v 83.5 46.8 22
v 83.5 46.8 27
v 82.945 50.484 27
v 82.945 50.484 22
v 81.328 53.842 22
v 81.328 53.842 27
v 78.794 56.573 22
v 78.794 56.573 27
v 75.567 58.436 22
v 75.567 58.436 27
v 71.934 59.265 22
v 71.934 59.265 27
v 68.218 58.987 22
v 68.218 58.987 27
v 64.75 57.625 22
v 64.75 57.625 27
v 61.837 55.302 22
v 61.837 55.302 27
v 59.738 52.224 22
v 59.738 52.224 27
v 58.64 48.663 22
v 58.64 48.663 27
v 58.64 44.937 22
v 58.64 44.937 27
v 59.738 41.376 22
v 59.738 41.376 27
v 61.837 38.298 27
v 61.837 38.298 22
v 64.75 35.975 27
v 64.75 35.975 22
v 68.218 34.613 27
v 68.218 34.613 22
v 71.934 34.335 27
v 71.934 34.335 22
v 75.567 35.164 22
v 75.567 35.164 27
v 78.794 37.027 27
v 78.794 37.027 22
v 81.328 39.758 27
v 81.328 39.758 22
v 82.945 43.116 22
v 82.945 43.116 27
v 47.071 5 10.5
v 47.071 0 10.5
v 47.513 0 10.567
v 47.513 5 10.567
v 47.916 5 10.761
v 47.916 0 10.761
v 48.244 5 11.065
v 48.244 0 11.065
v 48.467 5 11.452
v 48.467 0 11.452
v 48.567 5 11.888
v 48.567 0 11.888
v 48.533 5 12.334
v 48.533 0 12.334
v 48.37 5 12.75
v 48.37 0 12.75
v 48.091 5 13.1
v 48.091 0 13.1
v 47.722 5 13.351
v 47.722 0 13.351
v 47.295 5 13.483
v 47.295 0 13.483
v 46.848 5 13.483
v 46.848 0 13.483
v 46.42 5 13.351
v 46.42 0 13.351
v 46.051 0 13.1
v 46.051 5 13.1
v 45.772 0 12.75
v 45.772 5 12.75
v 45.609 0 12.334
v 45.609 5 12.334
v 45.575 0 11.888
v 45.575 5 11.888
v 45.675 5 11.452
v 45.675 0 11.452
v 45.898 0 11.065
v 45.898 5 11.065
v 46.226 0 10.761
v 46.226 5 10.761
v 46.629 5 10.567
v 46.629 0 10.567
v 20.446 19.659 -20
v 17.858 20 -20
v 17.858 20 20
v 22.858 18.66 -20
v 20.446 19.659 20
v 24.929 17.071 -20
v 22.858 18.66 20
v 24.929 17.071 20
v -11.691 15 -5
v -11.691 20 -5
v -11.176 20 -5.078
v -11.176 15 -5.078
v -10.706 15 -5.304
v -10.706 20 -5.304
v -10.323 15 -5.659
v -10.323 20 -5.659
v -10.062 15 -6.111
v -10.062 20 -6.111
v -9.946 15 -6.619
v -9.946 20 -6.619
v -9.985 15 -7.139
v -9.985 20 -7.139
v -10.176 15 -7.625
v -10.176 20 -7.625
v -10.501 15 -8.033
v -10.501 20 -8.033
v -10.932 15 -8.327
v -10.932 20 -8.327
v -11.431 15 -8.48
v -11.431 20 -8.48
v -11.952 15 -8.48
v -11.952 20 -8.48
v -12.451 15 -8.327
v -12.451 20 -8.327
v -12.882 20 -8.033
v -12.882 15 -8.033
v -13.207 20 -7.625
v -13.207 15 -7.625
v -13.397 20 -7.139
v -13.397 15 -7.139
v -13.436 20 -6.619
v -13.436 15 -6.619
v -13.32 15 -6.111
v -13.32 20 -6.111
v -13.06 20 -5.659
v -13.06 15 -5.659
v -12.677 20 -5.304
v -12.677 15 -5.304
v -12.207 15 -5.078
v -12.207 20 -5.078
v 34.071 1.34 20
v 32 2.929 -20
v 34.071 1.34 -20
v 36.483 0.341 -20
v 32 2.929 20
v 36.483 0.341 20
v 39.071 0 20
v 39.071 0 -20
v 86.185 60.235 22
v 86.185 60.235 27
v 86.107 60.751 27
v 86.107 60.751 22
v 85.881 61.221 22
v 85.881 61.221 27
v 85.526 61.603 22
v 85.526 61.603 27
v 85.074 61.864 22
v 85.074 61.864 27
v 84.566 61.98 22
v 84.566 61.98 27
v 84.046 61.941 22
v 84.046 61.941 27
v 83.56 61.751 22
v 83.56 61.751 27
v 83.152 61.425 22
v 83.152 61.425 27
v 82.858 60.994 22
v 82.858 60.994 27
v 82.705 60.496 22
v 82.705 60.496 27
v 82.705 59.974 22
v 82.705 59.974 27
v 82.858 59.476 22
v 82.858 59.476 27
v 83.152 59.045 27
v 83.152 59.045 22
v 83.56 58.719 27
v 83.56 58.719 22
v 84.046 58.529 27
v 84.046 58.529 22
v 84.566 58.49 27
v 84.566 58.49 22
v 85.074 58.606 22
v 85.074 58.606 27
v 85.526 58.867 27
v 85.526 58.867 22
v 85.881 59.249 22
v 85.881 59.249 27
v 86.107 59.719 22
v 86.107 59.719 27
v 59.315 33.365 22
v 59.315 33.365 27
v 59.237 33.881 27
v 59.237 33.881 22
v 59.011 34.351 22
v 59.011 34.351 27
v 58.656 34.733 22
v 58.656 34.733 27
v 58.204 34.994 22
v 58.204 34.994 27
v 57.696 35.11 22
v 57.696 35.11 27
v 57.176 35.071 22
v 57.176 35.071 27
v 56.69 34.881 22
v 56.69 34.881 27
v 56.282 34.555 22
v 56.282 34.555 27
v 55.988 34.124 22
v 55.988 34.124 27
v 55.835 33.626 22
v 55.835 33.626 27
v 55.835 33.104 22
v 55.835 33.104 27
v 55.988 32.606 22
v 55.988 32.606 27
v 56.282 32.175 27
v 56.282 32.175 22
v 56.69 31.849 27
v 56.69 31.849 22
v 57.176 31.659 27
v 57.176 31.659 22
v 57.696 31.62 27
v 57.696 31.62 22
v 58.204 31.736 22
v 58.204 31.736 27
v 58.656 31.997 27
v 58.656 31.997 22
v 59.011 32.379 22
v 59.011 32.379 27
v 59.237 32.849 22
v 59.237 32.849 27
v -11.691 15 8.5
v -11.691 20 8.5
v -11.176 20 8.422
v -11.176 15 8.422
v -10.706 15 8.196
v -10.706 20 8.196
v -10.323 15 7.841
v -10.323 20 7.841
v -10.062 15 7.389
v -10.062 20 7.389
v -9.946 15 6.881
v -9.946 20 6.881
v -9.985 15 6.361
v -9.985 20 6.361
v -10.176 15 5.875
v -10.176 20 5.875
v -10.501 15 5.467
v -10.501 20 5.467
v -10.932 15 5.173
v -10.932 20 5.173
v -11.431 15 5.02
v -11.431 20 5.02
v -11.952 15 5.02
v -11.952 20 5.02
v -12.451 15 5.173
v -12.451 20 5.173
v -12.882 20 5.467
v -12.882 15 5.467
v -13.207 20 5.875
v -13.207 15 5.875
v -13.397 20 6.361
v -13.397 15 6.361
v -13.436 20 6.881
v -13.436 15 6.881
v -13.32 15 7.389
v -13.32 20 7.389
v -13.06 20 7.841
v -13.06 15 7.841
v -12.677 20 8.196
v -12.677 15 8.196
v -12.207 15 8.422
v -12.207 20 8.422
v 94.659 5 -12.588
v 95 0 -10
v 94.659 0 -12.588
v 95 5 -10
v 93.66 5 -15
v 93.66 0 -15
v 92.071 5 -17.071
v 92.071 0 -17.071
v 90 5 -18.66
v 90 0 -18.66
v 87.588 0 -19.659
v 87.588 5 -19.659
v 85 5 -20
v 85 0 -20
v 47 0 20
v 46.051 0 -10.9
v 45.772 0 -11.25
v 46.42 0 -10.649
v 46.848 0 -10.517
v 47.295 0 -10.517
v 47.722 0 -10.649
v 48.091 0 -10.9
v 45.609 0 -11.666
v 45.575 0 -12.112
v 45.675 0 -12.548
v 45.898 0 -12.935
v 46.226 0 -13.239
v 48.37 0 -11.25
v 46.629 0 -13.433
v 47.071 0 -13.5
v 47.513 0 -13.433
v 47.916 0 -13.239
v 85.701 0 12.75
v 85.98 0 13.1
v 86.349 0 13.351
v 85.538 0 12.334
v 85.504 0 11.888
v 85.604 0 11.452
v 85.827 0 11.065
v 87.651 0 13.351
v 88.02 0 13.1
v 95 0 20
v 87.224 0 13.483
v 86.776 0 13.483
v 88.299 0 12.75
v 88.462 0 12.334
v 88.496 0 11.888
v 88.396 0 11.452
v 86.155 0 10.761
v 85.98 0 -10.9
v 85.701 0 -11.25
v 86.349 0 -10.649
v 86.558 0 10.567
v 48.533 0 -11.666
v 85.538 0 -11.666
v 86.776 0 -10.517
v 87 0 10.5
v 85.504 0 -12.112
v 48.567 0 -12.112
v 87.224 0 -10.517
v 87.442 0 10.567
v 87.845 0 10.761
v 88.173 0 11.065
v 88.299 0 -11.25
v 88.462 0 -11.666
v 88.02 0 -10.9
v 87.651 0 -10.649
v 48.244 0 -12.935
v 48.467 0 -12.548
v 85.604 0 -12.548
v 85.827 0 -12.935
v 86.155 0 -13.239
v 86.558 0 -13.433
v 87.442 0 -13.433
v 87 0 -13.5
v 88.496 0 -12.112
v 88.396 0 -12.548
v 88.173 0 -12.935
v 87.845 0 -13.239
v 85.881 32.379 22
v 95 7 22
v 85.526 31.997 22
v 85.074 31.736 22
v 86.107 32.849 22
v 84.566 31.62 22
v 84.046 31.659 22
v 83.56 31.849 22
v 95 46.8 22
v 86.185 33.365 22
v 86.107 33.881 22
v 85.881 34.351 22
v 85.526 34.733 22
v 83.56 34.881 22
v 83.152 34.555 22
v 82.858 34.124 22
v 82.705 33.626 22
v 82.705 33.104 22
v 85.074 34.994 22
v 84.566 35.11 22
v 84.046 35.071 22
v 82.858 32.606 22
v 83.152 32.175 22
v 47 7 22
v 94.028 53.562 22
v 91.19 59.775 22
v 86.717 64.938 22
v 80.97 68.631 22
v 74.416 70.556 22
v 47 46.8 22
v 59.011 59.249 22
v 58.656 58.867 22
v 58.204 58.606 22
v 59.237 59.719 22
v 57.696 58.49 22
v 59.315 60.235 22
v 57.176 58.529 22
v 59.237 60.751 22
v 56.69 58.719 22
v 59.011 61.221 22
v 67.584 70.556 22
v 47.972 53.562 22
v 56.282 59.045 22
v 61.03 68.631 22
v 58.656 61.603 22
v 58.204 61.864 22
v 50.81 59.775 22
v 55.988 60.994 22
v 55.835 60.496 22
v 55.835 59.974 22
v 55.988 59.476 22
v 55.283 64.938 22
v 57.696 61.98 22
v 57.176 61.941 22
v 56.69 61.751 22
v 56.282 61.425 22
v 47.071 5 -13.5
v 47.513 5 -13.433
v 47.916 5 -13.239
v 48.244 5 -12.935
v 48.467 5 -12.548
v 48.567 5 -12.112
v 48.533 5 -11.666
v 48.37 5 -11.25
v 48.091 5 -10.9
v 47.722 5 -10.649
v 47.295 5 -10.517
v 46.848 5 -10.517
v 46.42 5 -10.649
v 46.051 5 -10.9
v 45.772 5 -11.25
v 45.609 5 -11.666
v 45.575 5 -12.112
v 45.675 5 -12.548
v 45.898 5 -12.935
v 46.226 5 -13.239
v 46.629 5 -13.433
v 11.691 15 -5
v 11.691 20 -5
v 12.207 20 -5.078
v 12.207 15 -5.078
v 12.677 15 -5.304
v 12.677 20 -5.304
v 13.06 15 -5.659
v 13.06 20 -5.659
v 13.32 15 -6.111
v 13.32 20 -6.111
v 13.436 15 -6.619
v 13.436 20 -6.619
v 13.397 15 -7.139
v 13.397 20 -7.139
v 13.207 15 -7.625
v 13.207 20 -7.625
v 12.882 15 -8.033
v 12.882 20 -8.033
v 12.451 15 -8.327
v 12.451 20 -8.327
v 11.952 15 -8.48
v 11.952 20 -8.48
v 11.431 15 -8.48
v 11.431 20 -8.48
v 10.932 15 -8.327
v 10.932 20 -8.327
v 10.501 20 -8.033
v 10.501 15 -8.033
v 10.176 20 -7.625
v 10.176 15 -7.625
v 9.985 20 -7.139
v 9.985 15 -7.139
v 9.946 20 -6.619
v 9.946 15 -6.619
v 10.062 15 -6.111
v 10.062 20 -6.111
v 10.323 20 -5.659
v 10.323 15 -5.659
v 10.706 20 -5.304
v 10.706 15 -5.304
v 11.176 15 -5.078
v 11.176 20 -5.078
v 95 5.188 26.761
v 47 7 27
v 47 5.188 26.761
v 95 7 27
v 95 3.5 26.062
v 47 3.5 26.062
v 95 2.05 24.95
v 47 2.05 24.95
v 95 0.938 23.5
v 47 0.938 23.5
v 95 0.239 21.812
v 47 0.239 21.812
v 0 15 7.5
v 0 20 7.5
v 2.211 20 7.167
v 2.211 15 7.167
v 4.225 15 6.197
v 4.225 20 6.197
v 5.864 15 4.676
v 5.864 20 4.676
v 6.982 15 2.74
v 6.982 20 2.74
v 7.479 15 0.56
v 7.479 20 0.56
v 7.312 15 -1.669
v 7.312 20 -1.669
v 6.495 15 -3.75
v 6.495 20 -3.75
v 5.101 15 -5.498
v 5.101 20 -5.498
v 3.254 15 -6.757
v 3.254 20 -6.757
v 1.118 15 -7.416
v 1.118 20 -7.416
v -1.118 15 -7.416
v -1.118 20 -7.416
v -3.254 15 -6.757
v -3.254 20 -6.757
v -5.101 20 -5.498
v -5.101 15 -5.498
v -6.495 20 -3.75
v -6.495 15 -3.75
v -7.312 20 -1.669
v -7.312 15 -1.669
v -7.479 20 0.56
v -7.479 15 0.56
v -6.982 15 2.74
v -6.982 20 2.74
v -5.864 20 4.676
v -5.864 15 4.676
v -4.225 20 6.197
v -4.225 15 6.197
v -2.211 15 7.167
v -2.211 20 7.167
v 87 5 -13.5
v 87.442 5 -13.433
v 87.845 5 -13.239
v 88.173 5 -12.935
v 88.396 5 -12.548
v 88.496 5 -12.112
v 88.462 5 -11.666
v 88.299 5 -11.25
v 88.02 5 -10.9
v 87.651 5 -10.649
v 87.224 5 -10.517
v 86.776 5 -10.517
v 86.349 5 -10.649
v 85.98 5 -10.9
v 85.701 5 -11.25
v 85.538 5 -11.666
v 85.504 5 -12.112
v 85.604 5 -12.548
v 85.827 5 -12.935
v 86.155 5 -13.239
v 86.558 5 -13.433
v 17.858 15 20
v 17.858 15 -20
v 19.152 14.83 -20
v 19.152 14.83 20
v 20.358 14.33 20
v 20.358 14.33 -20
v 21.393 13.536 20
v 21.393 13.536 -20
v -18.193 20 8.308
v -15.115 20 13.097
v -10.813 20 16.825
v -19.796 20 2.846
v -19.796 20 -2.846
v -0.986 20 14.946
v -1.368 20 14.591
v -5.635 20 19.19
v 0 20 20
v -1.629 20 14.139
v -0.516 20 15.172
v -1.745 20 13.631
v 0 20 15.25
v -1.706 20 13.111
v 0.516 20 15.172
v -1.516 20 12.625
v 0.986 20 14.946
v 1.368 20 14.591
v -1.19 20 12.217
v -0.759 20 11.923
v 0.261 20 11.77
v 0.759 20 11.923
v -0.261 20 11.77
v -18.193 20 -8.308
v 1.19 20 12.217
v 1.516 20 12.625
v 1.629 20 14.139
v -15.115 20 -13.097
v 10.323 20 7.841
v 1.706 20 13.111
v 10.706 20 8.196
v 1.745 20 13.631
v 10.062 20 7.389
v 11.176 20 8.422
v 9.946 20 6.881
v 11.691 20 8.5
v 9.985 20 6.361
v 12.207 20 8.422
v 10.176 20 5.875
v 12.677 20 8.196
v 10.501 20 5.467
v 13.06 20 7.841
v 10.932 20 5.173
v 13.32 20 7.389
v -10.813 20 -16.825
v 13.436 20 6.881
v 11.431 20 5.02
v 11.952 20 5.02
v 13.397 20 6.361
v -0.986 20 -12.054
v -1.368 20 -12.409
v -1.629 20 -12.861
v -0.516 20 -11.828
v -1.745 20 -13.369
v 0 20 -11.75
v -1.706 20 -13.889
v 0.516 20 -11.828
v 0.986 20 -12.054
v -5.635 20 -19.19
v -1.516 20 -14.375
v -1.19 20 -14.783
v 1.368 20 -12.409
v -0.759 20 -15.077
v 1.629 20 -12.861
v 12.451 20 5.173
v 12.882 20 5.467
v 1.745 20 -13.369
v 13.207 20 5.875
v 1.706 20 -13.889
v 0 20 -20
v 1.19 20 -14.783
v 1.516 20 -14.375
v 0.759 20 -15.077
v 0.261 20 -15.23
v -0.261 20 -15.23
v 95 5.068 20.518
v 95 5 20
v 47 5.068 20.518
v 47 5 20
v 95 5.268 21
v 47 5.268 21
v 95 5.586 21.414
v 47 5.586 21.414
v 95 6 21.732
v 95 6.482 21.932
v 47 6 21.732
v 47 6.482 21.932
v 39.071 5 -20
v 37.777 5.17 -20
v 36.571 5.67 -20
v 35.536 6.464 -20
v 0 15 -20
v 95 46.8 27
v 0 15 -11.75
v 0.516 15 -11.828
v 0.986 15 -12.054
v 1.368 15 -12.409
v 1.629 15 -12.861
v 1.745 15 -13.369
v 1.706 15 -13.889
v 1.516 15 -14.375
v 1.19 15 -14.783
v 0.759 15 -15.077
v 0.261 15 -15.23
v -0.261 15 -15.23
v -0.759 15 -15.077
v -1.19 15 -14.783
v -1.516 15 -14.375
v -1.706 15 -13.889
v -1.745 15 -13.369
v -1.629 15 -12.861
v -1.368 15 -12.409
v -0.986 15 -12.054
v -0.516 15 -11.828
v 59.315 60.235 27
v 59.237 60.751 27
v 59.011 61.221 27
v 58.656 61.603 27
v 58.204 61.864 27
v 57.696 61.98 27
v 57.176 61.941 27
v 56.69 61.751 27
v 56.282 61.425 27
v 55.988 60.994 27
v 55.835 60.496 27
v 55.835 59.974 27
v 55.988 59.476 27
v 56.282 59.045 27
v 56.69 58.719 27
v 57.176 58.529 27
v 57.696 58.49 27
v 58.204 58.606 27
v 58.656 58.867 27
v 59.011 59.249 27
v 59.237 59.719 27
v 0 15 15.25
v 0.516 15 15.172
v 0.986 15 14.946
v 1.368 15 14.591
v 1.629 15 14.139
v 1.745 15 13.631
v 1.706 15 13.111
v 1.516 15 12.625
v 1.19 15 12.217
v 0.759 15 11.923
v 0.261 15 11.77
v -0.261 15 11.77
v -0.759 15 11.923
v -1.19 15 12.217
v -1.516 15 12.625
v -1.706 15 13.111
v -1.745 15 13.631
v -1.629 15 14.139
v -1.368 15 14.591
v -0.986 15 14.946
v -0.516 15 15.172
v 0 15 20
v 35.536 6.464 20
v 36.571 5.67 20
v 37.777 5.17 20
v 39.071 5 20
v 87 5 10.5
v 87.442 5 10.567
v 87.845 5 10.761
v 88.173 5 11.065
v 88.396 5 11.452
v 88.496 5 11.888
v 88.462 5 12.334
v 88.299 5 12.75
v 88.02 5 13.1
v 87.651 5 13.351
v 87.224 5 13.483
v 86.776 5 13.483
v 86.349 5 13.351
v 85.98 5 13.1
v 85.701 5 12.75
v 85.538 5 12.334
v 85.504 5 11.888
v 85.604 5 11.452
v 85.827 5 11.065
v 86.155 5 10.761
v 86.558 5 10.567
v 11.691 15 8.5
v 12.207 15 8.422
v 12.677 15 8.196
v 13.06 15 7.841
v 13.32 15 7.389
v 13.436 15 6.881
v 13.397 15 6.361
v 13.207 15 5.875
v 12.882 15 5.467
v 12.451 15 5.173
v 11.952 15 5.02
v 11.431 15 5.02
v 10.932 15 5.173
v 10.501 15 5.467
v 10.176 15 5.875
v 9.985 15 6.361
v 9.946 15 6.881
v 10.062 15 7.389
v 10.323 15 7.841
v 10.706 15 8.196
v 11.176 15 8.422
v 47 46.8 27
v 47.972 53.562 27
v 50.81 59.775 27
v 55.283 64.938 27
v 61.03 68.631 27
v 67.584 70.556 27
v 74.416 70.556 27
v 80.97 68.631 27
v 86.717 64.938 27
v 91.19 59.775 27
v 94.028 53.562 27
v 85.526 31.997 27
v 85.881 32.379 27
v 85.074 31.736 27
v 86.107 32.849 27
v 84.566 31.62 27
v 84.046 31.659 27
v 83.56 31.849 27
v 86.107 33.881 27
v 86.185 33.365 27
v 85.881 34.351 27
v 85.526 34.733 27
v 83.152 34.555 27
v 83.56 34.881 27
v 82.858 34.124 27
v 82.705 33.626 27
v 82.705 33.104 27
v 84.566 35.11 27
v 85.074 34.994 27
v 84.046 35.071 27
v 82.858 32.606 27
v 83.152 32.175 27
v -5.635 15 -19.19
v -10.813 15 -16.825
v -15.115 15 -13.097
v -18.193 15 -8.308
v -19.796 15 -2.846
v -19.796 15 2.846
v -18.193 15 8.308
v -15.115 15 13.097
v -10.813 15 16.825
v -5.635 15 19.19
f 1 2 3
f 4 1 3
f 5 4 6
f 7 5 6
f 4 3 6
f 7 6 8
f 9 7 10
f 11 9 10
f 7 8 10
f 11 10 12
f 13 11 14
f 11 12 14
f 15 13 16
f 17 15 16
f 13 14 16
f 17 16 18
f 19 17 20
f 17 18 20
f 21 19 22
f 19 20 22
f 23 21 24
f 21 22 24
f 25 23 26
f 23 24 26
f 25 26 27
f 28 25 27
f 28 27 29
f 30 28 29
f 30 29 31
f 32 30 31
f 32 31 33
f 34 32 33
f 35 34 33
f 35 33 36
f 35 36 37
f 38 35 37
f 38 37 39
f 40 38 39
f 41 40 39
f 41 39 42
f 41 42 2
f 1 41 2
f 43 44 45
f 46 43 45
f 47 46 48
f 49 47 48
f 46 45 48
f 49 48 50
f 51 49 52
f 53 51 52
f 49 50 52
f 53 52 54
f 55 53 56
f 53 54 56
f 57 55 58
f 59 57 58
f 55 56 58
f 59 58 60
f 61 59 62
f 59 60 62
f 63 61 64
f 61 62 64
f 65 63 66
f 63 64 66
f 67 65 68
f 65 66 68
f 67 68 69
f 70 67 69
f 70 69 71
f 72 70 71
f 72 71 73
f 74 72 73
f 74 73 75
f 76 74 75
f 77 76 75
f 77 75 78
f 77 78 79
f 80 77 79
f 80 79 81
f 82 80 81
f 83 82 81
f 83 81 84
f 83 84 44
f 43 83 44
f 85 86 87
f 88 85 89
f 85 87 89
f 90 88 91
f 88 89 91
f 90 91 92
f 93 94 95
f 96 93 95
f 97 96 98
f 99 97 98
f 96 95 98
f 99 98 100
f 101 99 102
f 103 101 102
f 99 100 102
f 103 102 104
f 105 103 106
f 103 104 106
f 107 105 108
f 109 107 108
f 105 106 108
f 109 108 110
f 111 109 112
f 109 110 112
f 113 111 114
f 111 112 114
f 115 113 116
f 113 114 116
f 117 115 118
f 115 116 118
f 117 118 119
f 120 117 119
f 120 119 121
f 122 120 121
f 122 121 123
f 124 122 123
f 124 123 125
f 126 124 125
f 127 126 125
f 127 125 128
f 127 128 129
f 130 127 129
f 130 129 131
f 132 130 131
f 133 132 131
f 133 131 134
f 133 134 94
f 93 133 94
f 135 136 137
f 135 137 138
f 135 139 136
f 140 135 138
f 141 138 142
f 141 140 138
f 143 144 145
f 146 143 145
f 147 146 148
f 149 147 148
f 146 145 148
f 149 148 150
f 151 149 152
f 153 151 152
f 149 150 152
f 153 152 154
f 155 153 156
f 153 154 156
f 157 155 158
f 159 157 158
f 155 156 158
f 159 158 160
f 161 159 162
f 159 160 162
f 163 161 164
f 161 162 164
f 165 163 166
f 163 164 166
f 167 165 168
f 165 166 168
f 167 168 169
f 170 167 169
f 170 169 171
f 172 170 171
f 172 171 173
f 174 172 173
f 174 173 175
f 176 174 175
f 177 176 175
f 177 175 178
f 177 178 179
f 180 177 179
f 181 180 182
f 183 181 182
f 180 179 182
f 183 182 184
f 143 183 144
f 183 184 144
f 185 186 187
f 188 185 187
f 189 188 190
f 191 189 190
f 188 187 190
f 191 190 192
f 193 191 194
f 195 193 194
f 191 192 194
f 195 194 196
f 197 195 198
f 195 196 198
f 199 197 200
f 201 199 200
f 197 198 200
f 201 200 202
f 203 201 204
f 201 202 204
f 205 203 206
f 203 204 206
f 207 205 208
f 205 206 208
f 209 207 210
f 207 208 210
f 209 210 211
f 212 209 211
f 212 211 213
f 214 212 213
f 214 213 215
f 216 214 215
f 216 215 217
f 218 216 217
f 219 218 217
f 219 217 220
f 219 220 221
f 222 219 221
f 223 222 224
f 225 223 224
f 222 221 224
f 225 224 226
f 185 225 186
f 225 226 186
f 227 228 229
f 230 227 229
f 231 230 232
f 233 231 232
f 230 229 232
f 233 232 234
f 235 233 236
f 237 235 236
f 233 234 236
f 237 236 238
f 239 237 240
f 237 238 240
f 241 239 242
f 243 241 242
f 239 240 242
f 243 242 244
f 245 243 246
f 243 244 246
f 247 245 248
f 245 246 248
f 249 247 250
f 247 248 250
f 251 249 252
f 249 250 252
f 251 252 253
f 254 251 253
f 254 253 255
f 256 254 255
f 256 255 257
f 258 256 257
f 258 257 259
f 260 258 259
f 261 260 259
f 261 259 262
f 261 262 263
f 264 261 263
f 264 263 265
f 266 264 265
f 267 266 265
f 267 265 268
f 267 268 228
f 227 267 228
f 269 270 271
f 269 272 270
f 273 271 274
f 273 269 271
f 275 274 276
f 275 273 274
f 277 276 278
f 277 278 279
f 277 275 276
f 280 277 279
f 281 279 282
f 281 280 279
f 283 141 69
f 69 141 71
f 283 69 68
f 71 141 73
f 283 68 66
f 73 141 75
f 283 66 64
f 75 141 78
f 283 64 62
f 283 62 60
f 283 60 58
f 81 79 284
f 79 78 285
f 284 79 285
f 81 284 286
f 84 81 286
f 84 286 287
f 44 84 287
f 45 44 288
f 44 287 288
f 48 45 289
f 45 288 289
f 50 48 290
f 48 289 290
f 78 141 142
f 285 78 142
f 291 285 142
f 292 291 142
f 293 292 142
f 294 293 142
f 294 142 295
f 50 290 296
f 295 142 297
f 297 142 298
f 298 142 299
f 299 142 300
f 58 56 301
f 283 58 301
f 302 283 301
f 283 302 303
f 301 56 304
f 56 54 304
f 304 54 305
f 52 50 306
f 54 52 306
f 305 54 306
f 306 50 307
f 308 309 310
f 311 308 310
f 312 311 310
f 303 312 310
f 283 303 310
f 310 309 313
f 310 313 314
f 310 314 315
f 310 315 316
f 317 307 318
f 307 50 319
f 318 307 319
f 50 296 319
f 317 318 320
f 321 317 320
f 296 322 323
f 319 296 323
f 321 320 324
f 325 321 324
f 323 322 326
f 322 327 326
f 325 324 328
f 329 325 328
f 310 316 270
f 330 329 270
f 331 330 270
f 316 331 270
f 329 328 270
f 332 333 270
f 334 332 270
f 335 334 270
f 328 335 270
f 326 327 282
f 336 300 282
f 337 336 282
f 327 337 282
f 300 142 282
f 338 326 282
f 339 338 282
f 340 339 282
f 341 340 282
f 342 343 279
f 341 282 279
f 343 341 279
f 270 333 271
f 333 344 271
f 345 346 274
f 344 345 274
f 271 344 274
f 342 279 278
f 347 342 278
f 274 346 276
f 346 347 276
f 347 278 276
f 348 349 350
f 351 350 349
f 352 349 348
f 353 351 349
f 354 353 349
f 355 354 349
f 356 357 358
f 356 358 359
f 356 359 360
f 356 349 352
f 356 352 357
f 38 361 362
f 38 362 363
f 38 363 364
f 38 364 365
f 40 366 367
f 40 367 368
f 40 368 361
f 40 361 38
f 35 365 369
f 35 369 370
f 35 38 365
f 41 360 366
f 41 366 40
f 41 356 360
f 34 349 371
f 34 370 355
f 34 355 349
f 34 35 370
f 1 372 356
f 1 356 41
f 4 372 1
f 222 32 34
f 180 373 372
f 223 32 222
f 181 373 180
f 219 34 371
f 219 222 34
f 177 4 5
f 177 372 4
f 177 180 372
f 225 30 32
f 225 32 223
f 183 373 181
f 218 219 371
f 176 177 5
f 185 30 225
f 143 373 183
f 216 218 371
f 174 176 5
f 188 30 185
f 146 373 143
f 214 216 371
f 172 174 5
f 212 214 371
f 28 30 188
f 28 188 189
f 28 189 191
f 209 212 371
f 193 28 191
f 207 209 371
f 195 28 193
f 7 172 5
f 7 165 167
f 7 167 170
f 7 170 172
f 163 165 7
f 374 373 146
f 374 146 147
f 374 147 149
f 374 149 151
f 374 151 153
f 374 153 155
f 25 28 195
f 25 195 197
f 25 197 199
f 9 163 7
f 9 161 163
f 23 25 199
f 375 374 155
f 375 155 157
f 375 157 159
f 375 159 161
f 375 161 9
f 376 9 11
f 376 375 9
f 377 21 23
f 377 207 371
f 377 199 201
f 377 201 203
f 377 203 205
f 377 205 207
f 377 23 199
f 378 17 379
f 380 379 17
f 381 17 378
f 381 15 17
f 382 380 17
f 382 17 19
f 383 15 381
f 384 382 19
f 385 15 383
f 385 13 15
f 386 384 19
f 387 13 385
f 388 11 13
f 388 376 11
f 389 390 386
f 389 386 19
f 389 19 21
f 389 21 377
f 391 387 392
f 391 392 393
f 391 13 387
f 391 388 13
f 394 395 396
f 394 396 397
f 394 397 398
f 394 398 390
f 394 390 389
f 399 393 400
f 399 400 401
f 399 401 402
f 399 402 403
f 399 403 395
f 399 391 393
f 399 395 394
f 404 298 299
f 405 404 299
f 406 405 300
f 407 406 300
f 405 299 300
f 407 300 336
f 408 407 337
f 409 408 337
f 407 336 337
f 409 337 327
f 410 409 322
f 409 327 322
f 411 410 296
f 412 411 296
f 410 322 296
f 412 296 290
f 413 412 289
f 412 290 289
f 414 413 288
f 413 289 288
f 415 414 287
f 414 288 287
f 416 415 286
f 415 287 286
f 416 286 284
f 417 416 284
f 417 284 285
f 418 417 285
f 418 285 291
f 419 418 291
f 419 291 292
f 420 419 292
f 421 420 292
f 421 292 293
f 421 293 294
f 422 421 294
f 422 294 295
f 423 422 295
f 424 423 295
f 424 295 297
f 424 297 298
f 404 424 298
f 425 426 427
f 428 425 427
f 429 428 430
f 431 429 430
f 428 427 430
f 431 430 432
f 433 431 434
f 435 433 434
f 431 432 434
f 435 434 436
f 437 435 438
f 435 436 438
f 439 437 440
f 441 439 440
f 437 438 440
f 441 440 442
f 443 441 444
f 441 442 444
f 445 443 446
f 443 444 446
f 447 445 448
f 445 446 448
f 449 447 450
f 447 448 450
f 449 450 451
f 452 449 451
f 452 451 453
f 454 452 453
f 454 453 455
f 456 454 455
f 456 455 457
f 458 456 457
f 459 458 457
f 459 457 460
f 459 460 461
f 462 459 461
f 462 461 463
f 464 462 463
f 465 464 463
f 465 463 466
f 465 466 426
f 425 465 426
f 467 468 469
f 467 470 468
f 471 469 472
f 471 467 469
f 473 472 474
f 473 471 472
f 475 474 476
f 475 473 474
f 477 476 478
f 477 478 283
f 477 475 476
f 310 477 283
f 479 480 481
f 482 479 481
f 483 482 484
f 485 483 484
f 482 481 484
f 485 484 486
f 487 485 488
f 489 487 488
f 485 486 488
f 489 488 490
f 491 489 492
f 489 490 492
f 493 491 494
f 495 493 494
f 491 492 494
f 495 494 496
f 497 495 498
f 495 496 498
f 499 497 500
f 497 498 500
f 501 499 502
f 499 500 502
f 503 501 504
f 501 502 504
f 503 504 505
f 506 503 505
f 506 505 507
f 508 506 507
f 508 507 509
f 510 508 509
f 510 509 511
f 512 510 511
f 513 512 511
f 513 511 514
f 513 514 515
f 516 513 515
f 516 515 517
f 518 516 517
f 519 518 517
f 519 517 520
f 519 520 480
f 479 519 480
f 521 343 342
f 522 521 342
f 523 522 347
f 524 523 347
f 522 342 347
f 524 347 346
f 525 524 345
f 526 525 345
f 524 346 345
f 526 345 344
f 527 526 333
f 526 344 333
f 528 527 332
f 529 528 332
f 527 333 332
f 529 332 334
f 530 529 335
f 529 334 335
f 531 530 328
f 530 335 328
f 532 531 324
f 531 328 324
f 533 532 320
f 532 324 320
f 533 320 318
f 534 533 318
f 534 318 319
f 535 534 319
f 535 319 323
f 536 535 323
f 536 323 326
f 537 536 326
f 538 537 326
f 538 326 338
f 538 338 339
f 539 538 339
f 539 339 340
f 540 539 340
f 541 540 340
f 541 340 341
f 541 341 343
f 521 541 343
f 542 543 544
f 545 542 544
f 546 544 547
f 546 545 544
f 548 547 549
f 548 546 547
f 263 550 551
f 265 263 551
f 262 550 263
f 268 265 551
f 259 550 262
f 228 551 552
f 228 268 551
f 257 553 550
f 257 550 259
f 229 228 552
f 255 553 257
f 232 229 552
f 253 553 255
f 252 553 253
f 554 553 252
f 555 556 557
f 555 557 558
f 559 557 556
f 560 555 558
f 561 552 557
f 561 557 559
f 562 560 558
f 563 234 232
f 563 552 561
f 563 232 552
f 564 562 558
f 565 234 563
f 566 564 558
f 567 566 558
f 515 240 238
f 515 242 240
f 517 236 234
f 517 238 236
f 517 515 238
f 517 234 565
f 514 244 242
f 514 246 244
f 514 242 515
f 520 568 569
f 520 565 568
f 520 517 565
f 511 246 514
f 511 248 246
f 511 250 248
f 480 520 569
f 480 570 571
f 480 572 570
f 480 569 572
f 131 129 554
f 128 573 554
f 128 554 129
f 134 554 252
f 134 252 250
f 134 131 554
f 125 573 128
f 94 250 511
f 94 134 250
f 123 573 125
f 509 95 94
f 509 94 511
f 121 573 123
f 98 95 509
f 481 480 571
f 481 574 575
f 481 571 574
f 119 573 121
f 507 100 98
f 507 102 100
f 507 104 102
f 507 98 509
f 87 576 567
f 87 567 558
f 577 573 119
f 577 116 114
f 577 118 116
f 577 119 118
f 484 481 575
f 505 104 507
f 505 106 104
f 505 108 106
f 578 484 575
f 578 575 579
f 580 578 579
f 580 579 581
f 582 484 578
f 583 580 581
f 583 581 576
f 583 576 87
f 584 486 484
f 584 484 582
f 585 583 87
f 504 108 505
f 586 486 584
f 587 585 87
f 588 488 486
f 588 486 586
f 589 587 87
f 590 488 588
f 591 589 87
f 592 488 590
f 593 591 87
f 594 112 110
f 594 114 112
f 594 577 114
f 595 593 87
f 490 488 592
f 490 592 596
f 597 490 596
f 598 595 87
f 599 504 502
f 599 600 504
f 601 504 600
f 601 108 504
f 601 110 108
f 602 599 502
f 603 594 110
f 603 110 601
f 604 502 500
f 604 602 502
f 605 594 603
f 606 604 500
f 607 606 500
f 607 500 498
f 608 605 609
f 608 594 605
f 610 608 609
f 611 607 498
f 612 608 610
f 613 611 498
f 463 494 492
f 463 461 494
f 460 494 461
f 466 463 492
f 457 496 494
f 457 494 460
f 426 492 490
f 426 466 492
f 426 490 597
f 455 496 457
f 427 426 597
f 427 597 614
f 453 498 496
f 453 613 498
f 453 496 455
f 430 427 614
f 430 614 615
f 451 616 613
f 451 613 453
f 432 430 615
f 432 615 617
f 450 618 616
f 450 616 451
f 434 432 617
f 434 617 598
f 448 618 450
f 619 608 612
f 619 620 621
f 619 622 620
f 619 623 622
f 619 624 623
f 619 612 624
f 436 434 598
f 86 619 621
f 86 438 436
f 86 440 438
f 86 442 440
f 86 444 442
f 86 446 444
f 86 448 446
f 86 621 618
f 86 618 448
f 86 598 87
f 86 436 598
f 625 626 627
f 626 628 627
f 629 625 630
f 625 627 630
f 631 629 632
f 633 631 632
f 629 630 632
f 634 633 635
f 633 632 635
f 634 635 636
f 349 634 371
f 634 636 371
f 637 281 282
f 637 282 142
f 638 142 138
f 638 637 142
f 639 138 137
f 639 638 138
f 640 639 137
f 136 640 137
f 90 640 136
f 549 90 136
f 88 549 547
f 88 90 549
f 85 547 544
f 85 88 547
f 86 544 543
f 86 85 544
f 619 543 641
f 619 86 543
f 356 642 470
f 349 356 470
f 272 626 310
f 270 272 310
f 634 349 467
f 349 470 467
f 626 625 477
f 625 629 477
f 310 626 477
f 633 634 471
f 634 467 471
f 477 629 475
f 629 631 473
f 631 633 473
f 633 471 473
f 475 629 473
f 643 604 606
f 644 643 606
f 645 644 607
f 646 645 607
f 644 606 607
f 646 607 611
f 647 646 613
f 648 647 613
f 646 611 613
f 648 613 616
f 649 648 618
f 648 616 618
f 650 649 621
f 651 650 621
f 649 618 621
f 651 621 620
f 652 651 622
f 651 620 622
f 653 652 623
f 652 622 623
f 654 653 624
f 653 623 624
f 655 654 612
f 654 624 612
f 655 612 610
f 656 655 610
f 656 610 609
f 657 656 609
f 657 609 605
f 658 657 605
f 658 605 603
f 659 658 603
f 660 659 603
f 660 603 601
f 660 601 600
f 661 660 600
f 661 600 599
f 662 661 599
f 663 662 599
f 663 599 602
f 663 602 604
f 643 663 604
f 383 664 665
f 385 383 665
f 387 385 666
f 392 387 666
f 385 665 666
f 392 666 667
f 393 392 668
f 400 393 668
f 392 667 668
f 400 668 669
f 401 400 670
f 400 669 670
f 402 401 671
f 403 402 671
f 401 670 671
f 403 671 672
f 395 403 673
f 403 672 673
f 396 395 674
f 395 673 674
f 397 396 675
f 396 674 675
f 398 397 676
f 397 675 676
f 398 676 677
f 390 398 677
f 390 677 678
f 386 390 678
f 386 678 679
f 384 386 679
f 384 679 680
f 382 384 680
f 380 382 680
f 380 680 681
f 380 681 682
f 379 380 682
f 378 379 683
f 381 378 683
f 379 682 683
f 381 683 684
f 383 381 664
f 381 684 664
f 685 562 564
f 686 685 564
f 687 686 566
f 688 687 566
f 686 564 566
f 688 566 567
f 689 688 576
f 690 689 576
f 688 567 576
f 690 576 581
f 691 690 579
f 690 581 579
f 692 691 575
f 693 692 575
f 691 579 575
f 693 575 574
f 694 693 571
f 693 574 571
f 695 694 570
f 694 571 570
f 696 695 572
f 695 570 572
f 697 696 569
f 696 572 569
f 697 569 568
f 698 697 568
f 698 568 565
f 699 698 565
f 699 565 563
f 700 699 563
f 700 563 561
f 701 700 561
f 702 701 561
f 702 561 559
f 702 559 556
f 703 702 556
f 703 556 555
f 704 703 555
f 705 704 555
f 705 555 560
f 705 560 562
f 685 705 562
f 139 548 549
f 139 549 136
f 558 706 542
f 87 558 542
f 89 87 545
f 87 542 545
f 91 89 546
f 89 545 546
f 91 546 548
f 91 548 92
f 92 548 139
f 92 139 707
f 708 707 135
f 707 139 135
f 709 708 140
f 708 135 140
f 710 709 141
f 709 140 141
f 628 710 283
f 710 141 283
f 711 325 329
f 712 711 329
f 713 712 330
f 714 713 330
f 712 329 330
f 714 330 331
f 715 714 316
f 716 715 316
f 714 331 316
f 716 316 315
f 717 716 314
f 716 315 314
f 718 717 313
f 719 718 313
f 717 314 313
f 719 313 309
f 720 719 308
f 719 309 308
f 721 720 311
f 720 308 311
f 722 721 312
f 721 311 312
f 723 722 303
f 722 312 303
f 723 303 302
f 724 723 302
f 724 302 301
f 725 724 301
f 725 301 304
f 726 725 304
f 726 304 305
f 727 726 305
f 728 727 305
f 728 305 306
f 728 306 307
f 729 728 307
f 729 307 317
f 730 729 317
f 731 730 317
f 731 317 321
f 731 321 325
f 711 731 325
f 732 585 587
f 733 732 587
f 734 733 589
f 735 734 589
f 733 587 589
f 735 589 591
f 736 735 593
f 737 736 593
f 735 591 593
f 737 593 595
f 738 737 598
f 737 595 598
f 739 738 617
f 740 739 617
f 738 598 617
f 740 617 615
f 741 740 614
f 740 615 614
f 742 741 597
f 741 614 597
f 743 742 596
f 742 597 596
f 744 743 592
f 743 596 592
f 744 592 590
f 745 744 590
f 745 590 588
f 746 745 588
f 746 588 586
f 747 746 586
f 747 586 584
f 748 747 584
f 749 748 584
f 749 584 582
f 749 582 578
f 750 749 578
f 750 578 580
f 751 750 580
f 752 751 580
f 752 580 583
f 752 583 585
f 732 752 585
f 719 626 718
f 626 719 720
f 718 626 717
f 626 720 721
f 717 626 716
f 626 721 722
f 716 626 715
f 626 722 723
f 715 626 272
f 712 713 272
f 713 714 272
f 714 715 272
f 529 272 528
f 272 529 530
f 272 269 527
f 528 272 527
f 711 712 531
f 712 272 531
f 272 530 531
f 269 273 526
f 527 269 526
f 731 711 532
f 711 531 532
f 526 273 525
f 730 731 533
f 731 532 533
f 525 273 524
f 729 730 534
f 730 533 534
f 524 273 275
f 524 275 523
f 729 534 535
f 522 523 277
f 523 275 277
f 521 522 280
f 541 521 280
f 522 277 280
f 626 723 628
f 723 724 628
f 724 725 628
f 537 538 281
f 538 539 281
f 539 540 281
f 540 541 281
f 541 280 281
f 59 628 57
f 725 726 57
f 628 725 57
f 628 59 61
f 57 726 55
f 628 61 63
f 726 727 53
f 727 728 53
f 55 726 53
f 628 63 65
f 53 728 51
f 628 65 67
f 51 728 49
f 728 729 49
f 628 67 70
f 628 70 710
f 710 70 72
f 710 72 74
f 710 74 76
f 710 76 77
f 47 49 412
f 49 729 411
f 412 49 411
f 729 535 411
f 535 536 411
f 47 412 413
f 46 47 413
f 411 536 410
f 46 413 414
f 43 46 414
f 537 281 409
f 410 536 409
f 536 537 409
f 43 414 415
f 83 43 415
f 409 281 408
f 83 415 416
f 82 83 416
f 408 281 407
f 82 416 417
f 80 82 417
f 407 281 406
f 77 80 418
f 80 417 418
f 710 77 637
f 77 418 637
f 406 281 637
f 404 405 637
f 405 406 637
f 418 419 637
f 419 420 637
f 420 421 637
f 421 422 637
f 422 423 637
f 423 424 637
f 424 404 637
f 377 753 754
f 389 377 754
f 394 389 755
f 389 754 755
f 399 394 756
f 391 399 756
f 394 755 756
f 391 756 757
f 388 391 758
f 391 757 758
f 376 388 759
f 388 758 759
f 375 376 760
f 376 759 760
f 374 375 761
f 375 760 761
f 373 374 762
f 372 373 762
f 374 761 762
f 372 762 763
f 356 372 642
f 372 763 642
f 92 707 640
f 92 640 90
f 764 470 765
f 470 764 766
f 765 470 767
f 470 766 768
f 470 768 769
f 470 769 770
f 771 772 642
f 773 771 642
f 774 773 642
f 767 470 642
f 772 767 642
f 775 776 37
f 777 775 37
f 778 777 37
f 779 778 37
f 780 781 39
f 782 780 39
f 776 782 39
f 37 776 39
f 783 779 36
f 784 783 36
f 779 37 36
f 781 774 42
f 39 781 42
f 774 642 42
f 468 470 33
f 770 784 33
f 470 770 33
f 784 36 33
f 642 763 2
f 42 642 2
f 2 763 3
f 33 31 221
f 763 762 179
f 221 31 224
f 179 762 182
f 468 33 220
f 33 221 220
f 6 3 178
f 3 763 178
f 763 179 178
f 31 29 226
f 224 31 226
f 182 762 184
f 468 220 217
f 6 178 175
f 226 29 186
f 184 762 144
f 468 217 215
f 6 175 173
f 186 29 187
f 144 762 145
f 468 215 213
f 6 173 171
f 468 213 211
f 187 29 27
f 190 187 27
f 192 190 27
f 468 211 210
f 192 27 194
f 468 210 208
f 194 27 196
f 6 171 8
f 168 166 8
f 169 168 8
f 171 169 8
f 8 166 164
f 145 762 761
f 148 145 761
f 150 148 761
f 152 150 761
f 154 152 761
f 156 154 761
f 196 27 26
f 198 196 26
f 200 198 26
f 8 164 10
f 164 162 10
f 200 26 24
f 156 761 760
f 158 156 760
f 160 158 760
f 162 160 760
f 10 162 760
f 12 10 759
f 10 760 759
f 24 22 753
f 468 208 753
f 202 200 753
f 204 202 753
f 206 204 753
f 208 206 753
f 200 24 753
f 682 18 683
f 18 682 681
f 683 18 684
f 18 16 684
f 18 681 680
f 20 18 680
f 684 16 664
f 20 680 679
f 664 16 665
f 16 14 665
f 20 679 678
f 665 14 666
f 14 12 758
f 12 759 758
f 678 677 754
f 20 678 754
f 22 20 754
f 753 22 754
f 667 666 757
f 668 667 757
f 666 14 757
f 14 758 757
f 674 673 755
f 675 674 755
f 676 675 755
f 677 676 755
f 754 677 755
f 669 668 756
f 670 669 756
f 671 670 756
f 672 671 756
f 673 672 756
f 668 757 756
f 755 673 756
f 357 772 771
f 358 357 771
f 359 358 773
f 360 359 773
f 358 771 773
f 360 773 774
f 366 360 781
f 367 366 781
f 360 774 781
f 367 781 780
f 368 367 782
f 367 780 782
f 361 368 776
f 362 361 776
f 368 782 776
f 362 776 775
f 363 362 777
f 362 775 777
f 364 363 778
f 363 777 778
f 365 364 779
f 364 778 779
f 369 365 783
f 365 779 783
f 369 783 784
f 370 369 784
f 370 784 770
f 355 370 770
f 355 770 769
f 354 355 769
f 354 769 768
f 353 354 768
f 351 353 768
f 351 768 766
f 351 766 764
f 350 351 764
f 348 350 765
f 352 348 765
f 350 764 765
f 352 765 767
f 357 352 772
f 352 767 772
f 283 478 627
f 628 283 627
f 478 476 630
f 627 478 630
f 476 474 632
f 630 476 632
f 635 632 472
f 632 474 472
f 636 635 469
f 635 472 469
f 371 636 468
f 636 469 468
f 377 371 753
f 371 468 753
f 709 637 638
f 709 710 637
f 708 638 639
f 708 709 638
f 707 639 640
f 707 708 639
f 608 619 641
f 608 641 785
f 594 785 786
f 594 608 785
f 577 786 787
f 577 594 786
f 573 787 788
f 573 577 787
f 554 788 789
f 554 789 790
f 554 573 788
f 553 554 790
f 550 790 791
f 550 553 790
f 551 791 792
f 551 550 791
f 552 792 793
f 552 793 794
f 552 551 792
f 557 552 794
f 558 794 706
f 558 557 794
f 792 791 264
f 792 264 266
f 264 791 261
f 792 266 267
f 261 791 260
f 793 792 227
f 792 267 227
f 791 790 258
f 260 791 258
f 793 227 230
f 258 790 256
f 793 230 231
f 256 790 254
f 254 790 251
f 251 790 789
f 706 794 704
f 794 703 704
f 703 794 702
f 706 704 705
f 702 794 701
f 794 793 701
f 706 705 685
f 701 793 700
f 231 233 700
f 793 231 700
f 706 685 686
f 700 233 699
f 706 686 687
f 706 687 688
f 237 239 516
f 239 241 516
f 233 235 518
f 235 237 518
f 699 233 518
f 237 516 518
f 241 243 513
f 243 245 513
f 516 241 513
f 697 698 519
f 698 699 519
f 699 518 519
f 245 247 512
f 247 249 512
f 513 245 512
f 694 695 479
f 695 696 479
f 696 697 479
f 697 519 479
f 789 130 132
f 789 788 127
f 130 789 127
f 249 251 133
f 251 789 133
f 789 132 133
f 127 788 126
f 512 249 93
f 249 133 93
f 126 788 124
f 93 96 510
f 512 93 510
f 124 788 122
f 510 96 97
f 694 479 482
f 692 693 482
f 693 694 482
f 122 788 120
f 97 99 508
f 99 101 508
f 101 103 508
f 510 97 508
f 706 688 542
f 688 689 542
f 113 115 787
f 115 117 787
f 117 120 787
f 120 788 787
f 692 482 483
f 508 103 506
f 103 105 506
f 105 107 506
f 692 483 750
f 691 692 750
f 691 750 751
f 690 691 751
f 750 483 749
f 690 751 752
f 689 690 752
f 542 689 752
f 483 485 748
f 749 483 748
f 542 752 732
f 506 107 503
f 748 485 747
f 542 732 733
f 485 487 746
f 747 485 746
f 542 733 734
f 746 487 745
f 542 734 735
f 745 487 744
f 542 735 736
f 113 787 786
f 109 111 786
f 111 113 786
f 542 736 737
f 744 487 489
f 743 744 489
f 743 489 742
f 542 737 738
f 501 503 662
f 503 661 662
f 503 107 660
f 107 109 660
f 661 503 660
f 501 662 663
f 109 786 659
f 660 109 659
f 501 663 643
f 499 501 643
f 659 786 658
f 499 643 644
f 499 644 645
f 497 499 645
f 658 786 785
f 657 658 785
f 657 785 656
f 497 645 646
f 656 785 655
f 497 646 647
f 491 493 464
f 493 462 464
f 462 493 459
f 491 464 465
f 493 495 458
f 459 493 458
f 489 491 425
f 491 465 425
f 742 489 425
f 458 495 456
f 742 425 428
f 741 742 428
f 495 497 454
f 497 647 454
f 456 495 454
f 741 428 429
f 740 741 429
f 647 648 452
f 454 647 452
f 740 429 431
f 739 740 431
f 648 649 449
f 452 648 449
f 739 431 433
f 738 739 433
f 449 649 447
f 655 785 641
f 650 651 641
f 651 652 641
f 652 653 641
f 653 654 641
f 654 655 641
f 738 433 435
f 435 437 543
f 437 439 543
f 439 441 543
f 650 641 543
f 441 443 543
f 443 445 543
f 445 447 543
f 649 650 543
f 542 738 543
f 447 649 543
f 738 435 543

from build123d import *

# Parameters (mm, degrees)
SKETCH_1_R           = 20
SKETCH_1_W           = 48
SKETCH_1_H           = 7
EXTRUDE_1_DEPTH      = 5
SKETCH_3_R           = 1.75
CUT_EXTRUDE_1_DEPTH  = 11
EXTRUDE_3_DEPTH      = 5
FILLET_8_R           = 2
FILLET_9_R           = 7
FILLET_10_R          = 10
SKETCH_9_R           = 1.75
CUT_EXTRUDE_2_DEPTH  = 5
EXTRUDE_START        = 15
SKETCH_10_R          = 1.75
EXTRUDE_4_DEPTH      = 15
CUT_EXTRUDE_4_DEPTH  = 40
FILLET_11_R          = 5
FILLET_12_R          = 10
FILLET_13_R          = 10
FILLET_14_R          = 5
SKETCH_17_R          = 7.5
CUT_EXTRUDE_9_DEPTH  = 10
SKETCH_18_R          = 12.5
CUT_EXTRUDE_10_DEPTH = 10
SKETCH_21_R          = 1.5
CUT_EXTRUDE_13_DEPTH = 10


with BuildPart() as part:
    # 草图1 → 凸台-拉伸1 (new body)
    with BuildSketch(Plane(origin=(0, 0, 0), x_dir=(1, 0, 0), z_dir=(0, 1, 0))):
        Circle(SKETCH_1_R)
        with BuildLine():
            Line((95, 20), (0, 20))
            ThreePointArc((0, 20), (14.142135624, 14.142135624), (20, 0))
            ThreePointArc((20, 0), (14.142135624, -14.142135624), (0, -20))
            Line((0, -20), (47, -20))
            Line((47, -20), (95, -20))
            Line((95, -20), (95, 20))
        make_face()
        with Locations((71, -23.5)):
            Rectangle(SKETCH_1_W, SKETCH_1_H)
    extrude(amount=EXTRUDE_1_DEPTH)

    # 草图3 → 切除-拉伸1 (cut)
    with BuildSketch(Plane(origin=(0, 5, 0), x_dir=(1, 0, 0), z_dir=(0, 1, 0))):
        with Locations(Location((0, 13.5, 0), (0, 0, 270))):
            Circle(SKETCH_3_R)
        with Locations(Location((11.691342951, 6.75, 0), (0, 0, 270))):
            Circle(SKETCH_3_R)
        with Locations(Location((11.691342951, -6.75, 0), (0, 0, 270))):
            Circle(SKETCH_3_R)
        with Locations(Location((0, -13.5, 0), (0, 0, 270))):
            Circle(SKETCH_3_R)
        with Locations(Location((-11.691342951, -6.75, 0), (0, 0, 270))):
            Circle(SKETCH_3_R)
        with Locations(Location((-11.691342951, 6.75, 0), (0, 0, 270))):
            Circle(SKETCH_3_R)
    extrude(amount=-CUT_EXTRUDE_1_DEPTH, mode=Mode.SUBTRACT)

    # 草图8 → 凸台-拉伸3 (add)
    with BuildSketch(Plane.XY.offset(27)):
        with BuildLine():
            Line((95, 46.8), (95, 0))
            Line((95, 0), (47, 0))
            Line((47, 0), (47, 46.8))
            ThreePointArc((47, 46.8), (71, 70.8), (95, 46.8))
        make_face()
    extrude(amount=-EXTRUDE_3_DEPTH)

    # 圆角8
    fillet_8_edges = [part.edges().sort_by_distance(p)[0] for p in [
        (71, 5, 22),
    ]]
    fillet(fillet_8_edges, radius=FILLET_8_R)

    # 圆角9
    fillet_9_edges = [part.edges().sort_by_distance(p)[0] for p in [
        (71, 0, 27),
    ]]
    fillet(fillet_9_edges, radius=FILLET_9_R)

    # 圆角10
    fillet_10_edges = [part.edges().sort_by_distance(p)[0] for p in [
        (95, 2.5, -20),
    ]]
    fillet(fillet_10_edges, radius=FILLET_10_R)

    # 草图9 → 切除-拉伸2 (cut)
    with BuildSketch(Plane.XY.offset(27)):
        with Locations((57.564971157, 60.235028843)):
            Circle(SKETCH_9_R)
        with Locations((84.435028843, 60.235028843)):
            Circle(SKETCH_9_R)
        with Locations((84.435028843, 33.364971157)):
            Circle(SKETCH_9_R)
        with Locations((57.564971157, 33.364971157)):
            Circle(SKETCH_9_R)
    extrude(amount=-CUT_EXTRUDE_2_DEPTH, mode=Mode.SUBTRACT)

    # 草图10 → 凸台-拉伸4 (add)
    with BuildSketch(Plane(origin=(0, 5, 0), x_dir=(1, 0, 0), z_dir=(0, 1, 0)).offset(EXTRUDE_START)):
        with BuildLine():
            Line((50, 20), (0, 20))
            ThreePointArc((0, 20), (-20, -7e-09), (1.4e-08, -20))
            Line((1.4e-08, -20), (50, -20))
            Line((50, -20), (50, 20))
        make_face()
        with Locations(Location((11.691342951, 6.75, 0), (0, 0, 270))):
            Circle(SKETCH_10_R, mode=Mode.SUBTRACT)
        with Locations(Location((0, 13.5, 0), (0, 0, 270))):
            Circle(SKETCH_10_R, mode=Mode.SUBTRACT)
        with Locations(Location((0, -13.5, 0), (0, 0, 270))):
            Circle(SKETCH_10_R, mode=Mode.SUBTRACT)
        with Locations(Location((-11.691342951, -6.75, 0), (0, 0, 270))):
            Circle(SKETCH_10_R, mode=Mode.SUBTRACT)
        with Locations(Location((11.691342951, -6.75, 0), (0, 0, 270))):
            Circle(SKETCH_10_R, mode=Mode.SUBTRACT)
        with Locations(Location((-11.691342951, 6.75, 0), (0, 0, 270))):
            Circle(SKETCH_10_R, mode=Mode.SUBTRACT)
    extrude(amount=-EXTRUDE_4_DEPTH)

    # 草图11 → 切除-拉伸4 (cut)
    with BuildSketch(Plane(origin=(0, 0, -20), x_dir=(-1, 0, 0), z_dir=(0, 0, -1))):
        Polygon((-50, 5), (-37, 5), (-22, 20), (-50, 20), align=None)
        Polygon((20, 0), (20, 15), (-19.928932188, 15), (-34.928932188, 0), align=None)
    extrude(amount=-CUT_EXTRUDE_4_DEPTH, mode=Mode.SUBTRACT)

    # 圆角11
    fillet_11_edges = [part.edges().sort_by_distance(p)[0] for p in [
        (19.928932188, 15, 0),
    ]]
    fillet(fillet_11_edges, radius=FILLET_11_R)

    # 圆角12
    fillet_12_edges = [part.edges().sort_by_distance(p)[0] for p in [
        (22, 20, 0),
    ]]
    fillet(fillet_12_edges, radius=FILLET_12_R)

    # 圆角13
    fillet_13_edges = [part.edges().sort_by_distance(p)[0] for p in [
        (34.928932188, 0, 0),
    ]]
    fillet(fillet_13_edges, radius=FILLET_13_R)

    # 圆角14
    fillet_14_edges = [part.edges().sort_by_distance(p)[0] for p in [
        (37, 5, 0),
    ]]
    fillet(fillet_14_edges, radius=FILLET_14_R)

    # 草图17 → 切除-拉伸9 (cut)
    with BuildSketch(Plane(origin=(0, 20, 0), x_dir=(1, 0, 0), z_dir=(0, 1, 0))):
        with Locations(Location((0, 0, 0), (0, 0, 270))):
            Circle(SKETCH_17_R)
    extrude(amount=-CUT_EXTRUDE_9_DEPTH, mode=Mode.SUBTRACT)

    # 草图18 → 切除-拉伸10 (cut)
    with BuildSketch(Plane.XY.offset(27)):
        with Locations((71, 46.8)):
            Circle(SKETCH_18_R)
    extrude(amount=-CUT_EXTRUDE_10_DEPTH, mode=Mode.SUBTRACT)

    # 草图21 → 切除-拉伸13 (cut)
    with BuildSketch(Plane.XZ):
        with Locations(Location((87, 12, 0), (0, 0, 270))):
            Circle(SKETCH_21_R)
        with Locations(Location((47.071067812, -12, 0), (0, 0, 270))):
            Circle(SKETCH_21_R)
        with Locations(Location((47.071067812, 12, 0), (0, 0, 270))):
            Circle(SKETCH_21_R)
        with Locations(Location((87, -12, 0), (0, 0, 270))):
            Circle(SKETCH_21_R)
    extrude(amount=-CUT_EXTRUDE_13_DEPTH, mode=Mode.SUBTRACT)


solid = part.part
